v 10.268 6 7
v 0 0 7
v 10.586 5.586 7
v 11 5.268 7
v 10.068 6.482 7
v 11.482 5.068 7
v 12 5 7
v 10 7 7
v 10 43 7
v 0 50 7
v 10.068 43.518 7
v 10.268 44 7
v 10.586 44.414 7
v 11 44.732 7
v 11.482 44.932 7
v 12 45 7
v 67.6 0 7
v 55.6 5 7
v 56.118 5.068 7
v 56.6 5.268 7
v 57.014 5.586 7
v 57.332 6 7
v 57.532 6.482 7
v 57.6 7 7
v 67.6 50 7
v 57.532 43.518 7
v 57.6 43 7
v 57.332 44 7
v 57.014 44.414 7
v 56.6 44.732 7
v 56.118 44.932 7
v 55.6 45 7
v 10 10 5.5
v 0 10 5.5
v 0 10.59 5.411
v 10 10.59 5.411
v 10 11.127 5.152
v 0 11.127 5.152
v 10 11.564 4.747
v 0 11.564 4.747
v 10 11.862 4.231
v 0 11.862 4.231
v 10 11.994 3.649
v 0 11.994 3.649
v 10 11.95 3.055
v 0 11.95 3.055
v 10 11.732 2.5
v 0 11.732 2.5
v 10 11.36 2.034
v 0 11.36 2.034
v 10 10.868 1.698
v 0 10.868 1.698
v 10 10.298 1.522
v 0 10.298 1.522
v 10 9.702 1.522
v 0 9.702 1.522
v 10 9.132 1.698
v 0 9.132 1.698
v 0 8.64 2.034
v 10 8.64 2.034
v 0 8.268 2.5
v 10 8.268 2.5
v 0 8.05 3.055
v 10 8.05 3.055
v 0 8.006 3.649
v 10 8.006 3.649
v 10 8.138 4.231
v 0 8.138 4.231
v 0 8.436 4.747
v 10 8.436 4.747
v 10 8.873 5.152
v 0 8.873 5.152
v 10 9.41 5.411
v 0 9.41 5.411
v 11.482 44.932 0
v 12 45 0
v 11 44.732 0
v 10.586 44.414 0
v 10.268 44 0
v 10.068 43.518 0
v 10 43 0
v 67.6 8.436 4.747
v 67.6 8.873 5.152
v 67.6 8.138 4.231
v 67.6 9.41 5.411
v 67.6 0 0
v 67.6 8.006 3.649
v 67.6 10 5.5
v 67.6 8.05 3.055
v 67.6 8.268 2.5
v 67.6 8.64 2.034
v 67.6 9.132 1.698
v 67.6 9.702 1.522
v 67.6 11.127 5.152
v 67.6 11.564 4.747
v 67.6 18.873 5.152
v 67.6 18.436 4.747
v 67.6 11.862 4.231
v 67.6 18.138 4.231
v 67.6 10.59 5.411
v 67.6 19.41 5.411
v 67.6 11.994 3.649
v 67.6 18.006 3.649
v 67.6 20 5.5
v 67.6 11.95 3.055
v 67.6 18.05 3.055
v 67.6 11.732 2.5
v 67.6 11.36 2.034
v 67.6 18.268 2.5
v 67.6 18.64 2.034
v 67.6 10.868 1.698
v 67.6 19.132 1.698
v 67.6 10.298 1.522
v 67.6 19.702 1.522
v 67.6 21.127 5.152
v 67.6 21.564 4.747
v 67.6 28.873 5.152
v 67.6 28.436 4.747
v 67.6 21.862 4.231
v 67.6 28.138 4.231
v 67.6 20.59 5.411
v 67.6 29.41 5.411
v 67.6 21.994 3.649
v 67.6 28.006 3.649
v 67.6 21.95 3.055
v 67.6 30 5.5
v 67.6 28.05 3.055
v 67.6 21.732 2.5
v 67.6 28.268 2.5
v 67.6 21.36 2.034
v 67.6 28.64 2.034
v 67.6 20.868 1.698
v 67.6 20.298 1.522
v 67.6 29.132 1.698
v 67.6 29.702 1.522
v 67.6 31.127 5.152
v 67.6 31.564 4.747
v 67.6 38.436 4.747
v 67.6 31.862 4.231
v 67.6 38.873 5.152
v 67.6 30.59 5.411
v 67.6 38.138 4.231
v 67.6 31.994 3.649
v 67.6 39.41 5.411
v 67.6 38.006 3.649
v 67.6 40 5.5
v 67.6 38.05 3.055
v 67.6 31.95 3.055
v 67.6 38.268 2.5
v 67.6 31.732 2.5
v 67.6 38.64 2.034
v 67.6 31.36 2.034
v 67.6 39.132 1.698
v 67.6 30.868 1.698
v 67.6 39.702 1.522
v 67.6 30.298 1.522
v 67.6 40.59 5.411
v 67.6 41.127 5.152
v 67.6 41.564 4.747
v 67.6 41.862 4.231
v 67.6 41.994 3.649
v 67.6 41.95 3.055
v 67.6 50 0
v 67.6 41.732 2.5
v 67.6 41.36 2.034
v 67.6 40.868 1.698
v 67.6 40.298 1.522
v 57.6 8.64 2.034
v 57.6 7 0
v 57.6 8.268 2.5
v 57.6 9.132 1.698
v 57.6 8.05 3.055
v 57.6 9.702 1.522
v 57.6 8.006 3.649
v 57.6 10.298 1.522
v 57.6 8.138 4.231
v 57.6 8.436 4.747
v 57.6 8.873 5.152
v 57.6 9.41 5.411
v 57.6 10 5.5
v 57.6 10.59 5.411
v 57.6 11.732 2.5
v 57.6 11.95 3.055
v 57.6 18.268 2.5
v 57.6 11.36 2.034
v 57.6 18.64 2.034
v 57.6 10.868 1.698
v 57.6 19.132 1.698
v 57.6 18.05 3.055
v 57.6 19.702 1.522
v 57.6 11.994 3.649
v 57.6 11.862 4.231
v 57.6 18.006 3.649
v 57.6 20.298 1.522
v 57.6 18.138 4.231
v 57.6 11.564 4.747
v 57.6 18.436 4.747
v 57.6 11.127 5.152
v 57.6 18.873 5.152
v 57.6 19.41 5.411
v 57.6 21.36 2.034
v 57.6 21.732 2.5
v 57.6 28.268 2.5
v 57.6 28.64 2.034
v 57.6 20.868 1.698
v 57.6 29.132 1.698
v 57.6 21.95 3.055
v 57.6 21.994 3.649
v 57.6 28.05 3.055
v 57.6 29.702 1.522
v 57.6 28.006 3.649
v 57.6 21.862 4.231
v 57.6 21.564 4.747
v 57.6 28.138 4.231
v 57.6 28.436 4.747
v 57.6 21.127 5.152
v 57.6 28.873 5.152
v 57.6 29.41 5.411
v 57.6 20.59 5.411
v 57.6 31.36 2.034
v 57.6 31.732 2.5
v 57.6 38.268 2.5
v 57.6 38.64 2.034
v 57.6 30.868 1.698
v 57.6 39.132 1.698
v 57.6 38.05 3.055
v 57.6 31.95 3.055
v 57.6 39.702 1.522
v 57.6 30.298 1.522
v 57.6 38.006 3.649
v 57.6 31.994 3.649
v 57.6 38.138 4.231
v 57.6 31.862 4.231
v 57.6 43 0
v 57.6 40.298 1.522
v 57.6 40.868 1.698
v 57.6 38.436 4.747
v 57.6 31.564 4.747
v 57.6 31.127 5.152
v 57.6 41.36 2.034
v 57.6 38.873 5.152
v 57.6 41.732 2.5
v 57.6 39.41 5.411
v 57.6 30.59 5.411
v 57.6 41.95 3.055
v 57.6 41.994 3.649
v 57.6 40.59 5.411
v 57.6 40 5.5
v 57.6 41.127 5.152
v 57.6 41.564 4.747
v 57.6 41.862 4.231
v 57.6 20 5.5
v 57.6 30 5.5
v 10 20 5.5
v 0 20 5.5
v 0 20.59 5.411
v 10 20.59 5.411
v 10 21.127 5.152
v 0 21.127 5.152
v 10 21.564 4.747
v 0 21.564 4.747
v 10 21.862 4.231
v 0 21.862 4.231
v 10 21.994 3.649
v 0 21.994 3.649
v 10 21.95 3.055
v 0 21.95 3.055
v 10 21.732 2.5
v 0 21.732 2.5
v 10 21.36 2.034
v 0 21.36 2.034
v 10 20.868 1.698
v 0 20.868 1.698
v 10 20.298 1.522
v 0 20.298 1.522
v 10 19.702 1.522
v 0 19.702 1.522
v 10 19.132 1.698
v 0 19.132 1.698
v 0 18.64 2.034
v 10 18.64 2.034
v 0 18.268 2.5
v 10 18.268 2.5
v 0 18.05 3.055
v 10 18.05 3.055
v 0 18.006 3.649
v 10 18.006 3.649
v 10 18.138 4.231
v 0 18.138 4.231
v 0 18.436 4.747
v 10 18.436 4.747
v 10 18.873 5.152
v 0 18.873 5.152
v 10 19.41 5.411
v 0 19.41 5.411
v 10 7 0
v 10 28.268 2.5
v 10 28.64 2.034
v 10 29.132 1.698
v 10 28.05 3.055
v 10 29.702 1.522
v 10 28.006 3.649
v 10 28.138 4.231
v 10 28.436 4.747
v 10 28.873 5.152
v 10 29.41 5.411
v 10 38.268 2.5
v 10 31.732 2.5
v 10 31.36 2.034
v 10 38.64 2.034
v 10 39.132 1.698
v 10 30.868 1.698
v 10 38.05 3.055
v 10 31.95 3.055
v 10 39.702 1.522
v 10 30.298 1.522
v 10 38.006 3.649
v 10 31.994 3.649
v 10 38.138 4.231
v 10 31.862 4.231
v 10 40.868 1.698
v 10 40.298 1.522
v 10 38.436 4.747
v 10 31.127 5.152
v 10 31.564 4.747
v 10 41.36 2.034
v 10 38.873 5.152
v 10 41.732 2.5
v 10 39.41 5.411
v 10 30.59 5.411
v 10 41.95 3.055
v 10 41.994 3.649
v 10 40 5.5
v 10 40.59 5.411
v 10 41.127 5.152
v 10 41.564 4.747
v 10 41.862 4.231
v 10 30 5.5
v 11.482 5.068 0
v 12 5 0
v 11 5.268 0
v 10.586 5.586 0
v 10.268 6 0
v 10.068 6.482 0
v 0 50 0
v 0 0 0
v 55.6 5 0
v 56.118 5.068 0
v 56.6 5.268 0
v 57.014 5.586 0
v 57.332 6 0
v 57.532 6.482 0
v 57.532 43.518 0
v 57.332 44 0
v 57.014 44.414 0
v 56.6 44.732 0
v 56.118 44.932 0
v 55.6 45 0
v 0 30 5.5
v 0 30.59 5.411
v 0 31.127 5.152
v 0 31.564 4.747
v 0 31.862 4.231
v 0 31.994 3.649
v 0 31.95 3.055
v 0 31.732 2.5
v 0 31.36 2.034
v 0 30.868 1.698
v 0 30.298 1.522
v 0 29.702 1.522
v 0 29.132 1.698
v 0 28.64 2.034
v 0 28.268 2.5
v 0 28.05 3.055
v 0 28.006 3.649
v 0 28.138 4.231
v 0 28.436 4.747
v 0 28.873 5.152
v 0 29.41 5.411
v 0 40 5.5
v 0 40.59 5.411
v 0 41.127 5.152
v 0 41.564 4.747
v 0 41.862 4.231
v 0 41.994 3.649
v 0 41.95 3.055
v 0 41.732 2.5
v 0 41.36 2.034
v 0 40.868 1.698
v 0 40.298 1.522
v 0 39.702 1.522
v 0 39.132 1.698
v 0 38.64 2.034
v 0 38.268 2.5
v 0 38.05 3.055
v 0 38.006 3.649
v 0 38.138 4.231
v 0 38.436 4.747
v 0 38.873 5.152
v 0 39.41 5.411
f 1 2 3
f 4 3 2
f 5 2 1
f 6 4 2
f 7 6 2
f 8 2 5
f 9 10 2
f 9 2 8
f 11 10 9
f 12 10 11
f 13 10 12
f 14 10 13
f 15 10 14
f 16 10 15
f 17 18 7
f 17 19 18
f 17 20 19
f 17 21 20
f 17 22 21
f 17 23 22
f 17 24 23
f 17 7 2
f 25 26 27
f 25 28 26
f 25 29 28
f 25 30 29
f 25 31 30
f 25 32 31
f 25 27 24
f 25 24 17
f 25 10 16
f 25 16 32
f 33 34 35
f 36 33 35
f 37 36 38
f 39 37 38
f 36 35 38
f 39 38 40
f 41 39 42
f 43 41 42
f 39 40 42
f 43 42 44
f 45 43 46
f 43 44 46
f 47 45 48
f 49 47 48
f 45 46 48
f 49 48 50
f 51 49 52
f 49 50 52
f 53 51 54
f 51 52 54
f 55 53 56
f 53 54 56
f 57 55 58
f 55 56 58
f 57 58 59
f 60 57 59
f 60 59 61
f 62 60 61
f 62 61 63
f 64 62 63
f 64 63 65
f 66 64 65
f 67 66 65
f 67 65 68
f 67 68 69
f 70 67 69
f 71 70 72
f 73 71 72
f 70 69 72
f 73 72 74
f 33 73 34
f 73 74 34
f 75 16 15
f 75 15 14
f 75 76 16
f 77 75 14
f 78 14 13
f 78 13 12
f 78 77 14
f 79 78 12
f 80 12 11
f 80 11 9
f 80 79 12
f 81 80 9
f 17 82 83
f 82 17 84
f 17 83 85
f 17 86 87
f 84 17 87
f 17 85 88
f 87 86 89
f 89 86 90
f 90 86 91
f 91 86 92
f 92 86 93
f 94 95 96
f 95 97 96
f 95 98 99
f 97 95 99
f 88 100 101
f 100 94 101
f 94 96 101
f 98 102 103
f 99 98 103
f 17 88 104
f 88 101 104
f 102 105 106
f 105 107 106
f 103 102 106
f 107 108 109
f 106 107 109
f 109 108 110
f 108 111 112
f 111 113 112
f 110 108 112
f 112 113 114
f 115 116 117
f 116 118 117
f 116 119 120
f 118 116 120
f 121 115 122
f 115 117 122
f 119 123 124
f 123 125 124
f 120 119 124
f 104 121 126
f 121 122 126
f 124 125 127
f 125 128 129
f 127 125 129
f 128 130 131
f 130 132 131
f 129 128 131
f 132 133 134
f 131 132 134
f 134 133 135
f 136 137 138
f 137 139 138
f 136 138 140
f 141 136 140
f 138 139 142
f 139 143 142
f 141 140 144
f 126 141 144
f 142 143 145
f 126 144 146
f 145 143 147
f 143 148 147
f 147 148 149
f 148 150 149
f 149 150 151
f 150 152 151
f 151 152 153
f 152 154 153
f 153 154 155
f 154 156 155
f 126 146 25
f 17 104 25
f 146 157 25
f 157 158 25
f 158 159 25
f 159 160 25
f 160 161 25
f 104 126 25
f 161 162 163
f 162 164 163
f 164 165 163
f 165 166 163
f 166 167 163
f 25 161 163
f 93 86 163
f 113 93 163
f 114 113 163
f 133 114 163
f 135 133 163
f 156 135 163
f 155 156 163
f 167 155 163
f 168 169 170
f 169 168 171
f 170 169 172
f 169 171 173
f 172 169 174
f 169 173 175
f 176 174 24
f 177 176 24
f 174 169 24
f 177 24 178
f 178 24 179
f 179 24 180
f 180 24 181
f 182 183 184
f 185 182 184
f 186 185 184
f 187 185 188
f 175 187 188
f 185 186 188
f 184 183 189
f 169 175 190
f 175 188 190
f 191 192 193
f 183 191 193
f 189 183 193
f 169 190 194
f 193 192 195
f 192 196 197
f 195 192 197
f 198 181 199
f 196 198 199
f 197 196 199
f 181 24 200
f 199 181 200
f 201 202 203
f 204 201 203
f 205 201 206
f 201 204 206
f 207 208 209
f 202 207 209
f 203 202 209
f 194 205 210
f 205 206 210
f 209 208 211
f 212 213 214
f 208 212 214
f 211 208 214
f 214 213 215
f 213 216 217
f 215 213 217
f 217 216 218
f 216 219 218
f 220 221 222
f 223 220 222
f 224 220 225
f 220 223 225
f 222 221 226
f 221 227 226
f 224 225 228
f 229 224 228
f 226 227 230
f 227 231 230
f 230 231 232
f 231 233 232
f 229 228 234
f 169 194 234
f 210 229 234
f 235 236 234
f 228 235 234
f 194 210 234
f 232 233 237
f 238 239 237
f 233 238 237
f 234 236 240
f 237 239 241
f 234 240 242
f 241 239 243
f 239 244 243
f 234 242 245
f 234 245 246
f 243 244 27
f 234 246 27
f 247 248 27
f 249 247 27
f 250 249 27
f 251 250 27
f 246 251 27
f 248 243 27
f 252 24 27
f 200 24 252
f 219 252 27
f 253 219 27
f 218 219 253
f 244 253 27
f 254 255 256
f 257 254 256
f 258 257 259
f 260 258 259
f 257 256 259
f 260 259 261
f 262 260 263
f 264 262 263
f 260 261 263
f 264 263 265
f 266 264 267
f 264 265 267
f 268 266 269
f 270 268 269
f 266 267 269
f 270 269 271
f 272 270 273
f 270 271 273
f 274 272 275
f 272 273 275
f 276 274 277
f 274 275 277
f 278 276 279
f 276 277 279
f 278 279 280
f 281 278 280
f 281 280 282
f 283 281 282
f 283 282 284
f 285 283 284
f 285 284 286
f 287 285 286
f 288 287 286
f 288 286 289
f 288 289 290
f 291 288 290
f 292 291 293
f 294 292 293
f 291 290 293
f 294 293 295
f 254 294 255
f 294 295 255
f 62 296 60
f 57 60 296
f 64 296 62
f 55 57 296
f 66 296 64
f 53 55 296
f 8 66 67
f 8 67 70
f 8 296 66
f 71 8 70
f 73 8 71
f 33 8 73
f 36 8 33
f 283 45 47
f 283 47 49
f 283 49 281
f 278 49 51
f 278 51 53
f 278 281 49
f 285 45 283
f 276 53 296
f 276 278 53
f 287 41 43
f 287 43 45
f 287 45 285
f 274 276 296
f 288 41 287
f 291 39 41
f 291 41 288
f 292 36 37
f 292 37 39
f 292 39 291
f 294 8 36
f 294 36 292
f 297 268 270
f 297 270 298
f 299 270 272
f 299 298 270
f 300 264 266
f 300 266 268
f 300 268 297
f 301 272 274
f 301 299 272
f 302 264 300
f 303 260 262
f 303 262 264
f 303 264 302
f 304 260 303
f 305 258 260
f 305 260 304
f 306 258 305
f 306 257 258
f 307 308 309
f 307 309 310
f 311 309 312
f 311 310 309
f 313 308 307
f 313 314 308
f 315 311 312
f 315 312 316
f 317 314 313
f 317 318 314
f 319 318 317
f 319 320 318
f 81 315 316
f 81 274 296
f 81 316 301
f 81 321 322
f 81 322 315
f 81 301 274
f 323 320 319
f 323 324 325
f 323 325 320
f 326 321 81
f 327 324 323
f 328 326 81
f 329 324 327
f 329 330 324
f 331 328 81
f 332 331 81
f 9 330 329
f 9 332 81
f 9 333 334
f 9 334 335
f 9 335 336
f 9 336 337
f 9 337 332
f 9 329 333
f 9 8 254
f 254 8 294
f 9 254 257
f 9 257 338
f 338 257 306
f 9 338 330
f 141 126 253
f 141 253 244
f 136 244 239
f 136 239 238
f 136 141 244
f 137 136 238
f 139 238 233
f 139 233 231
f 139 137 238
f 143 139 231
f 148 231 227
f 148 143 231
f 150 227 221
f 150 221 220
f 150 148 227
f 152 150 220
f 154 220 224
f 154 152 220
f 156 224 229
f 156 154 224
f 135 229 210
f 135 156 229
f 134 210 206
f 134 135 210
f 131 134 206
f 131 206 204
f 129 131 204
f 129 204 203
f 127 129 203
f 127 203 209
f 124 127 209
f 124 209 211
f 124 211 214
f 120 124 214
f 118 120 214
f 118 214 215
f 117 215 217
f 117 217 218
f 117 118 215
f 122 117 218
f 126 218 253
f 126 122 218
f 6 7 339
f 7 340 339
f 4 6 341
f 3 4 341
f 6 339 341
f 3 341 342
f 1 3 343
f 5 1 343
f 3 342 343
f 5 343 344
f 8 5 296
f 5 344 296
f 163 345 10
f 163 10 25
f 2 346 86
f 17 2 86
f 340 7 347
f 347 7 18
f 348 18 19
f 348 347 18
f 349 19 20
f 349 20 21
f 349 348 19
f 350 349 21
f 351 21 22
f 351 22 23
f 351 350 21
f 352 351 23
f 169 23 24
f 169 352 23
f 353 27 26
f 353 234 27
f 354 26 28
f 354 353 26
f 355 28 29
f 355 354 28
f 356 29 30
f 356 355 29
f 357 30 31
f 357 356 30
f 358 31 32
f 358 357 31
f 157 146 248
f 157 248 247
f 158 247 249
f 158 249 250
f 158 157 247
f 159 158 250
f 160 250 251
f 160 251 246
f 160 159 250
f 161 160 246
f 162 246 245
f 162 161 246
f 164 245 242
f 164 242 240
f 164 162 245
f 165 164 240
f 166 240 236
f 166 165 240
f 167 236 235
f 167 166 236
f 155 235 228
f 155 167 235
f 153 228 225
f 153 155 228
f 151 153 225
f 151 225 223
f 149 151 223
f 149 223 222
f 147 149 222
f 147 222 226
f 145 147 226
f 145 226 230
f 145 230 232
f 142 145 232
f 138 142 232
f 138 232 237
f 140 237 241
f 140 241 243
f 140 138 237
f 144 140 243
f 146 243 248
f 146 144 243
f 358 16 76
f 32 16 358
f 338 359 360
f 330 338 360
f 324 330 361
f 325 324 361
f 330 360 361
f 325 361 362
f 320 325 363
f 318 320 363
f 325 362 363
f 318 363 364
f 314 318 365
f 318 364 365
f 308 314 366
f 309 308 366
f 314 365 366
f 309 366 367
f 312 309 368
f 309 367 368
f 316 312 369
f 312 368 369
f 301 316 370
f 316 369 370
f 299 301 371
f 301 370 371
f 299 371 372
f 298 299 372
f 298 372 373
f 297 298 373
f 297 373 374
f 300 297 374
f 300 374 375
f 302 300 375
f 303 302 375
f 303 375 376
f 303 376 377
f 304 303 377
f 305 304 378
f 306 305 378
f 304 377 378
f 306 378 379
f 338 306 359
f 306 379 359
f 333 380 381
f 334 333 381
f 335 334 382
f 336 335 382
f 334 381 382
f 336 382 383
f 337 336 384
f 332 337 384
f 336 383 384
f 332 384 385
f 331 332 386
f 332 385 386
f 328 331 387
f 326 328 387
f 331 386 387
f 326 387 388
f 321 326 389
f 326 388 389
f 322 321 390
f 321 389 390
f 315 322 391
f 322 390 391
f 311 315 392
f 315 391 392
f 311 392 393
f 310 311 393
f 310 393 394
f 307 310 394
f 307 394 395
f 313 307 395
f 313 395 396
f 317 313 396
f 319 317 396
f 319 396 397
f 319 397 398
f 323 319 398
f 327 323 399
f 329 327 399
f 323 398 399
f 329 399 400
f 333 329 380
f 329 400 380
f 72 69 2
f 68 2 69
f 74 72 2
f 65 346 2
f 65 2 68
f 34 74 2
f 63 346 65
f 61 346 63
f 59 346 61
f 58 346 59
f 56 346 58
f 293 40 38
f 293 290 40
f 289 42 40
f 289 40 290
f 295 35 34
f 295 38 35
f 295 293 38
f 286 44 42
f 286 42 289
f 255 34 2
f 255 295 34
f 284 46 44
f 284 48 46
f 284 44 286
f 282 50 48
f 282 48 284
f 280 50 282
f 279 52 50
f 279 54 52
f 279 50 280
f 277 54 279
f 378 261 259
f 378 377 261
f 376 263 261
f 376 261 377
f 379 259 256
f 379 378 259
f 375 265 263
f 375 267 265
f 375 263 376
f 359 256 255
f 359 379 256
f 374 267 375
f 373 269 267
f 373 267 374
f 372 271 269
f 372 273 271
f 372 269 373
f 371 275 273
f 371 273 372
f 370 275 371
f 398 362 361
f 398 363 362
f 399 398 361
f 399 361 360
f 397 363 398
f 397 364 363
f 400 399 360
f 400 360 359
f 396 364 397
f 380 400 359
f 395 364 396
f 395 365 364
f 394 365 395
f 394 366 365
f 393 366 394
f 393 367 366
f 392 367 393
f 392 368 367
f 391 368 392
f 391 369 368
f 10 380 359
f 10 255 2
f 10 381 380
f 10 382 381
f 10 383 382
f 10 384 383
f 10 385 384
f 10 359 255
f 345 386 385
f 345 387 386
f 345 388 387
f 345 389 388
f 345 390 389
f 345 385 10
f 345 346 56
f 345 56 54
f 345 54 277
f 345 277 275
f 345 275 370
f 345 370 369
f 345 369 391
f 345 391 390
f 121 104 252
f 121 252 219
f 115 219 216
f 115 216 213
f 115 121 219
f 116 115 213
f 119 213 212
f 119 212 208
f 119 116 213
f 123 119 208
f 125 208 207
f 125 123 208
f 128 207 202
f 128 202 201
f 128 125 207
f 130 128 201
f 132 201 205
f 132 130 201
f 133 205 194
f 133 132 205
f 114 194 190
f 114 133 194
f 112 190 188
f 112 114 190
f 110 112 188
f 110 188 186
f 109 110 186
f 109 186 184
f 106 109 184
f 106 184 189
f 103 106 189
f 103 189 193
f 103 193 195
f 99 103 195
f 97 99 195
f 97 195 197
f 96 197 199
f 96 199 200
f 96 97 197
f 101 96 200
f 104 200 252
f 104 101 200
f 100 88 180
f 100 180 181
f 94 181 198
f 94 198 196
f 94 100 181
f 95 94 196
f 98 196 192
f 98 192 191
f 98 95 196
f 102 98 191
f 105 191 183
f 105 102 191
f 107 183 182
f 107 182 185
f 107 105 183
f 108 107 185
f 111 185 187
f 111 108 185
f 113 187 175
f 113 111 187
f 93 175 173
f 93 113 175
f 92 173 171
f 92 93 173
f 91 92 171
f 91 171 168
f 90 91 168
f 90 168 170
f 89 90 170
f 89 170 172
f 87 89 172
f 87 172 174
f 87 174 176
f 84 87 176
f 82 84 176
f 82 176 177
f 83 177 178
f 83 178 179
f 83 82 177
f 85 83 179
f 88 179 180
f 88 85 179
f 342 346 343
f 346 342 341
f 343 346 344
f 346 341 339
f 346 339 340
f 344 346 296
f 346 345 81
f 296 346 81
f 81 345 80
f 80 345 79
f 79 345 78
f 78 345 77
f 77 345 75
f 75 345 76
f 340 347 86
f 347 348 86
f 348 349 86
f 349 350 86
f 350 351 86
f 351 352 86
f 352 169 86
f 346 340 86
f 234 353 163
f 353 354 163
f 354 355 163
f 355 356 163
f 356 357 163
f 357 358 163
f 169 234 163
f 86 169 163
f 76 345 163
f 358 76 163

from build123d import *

# Parameters (mm, degrees)
SKETCH_1_W          = 67.6
SKETCH_1_H          = 50
EXTRUDE_1_DEPTH     = 7
SKETCH_2_R          = 2
CUT_EXTRUDE_1_DEPTH = 10
SKETCH_3_W          = 47.6
SKETCH_3_H          = 40
CUT_EXTRUDE_2_DEPTH = 7
FILLET_1_R          = 2


with BuildPart() as part:
    # 草图1 → 凸台-拉伸1 (new body)
    with BuildSketch(Plane.XY):
        with Locations((33.8, 25)):
            Rectangle(SKETCH_1_W, SKETCH_1_H)
    extrude(amount=EXTRUDE_1_DEPTH)

    # 草图2 → 切除-拉伸1 (cut)
    with BuildSketch(Plane.ZY):
        with Locations((3.5, 40)):
            Circle(SKETCH_2_R)
        with Locations((3.5, 30)):
            Circle(SKETCH_2_R)
        with Locations((3.5, 20)):
            Circle(SKETCH_2_R)
        with Locations((3.5, 10)):
            Circle(SKETCH_2_R)
    cut_extrude_1 = extrude(amount=-CUT_EXTRUDE_1_DEPTH, mode=Mode.SUBTRACT)

    # 镜向1: 切除-拉伸1 across plane
    add(cut_extrude_1.mirror(Plane(origin=(33.8, 0, 0), x_dir=(0, 0, 1), z_dir=(1, 0, 0))), mode=Mode.SUBTRACT)

    # 草图3 → 切除-拉伸2 (cut)
    with BuildSketch(Plane.XY.offset(7)):
        with Locations((33.8, 25)):
            Rectangle(SKETCH_3_W, SKETCH_3_H)
    extrude(amount=-CUT_EXTRUDE_2_DEPTH, mode=Mode.SUBTRACT)

    # 圆角1
    fillet_1_edges = [part.edges().sort_by_distance(p)[0] for p in [
        (10, 5, 3.5),
        (10, 45, 3.5),
        (57.6, 45, 3.5),
        (57.6, 5, 3.5),
    ]]
    fillet(fillet_1_edges, radius=FILLET_1_R)


solid = part.part
